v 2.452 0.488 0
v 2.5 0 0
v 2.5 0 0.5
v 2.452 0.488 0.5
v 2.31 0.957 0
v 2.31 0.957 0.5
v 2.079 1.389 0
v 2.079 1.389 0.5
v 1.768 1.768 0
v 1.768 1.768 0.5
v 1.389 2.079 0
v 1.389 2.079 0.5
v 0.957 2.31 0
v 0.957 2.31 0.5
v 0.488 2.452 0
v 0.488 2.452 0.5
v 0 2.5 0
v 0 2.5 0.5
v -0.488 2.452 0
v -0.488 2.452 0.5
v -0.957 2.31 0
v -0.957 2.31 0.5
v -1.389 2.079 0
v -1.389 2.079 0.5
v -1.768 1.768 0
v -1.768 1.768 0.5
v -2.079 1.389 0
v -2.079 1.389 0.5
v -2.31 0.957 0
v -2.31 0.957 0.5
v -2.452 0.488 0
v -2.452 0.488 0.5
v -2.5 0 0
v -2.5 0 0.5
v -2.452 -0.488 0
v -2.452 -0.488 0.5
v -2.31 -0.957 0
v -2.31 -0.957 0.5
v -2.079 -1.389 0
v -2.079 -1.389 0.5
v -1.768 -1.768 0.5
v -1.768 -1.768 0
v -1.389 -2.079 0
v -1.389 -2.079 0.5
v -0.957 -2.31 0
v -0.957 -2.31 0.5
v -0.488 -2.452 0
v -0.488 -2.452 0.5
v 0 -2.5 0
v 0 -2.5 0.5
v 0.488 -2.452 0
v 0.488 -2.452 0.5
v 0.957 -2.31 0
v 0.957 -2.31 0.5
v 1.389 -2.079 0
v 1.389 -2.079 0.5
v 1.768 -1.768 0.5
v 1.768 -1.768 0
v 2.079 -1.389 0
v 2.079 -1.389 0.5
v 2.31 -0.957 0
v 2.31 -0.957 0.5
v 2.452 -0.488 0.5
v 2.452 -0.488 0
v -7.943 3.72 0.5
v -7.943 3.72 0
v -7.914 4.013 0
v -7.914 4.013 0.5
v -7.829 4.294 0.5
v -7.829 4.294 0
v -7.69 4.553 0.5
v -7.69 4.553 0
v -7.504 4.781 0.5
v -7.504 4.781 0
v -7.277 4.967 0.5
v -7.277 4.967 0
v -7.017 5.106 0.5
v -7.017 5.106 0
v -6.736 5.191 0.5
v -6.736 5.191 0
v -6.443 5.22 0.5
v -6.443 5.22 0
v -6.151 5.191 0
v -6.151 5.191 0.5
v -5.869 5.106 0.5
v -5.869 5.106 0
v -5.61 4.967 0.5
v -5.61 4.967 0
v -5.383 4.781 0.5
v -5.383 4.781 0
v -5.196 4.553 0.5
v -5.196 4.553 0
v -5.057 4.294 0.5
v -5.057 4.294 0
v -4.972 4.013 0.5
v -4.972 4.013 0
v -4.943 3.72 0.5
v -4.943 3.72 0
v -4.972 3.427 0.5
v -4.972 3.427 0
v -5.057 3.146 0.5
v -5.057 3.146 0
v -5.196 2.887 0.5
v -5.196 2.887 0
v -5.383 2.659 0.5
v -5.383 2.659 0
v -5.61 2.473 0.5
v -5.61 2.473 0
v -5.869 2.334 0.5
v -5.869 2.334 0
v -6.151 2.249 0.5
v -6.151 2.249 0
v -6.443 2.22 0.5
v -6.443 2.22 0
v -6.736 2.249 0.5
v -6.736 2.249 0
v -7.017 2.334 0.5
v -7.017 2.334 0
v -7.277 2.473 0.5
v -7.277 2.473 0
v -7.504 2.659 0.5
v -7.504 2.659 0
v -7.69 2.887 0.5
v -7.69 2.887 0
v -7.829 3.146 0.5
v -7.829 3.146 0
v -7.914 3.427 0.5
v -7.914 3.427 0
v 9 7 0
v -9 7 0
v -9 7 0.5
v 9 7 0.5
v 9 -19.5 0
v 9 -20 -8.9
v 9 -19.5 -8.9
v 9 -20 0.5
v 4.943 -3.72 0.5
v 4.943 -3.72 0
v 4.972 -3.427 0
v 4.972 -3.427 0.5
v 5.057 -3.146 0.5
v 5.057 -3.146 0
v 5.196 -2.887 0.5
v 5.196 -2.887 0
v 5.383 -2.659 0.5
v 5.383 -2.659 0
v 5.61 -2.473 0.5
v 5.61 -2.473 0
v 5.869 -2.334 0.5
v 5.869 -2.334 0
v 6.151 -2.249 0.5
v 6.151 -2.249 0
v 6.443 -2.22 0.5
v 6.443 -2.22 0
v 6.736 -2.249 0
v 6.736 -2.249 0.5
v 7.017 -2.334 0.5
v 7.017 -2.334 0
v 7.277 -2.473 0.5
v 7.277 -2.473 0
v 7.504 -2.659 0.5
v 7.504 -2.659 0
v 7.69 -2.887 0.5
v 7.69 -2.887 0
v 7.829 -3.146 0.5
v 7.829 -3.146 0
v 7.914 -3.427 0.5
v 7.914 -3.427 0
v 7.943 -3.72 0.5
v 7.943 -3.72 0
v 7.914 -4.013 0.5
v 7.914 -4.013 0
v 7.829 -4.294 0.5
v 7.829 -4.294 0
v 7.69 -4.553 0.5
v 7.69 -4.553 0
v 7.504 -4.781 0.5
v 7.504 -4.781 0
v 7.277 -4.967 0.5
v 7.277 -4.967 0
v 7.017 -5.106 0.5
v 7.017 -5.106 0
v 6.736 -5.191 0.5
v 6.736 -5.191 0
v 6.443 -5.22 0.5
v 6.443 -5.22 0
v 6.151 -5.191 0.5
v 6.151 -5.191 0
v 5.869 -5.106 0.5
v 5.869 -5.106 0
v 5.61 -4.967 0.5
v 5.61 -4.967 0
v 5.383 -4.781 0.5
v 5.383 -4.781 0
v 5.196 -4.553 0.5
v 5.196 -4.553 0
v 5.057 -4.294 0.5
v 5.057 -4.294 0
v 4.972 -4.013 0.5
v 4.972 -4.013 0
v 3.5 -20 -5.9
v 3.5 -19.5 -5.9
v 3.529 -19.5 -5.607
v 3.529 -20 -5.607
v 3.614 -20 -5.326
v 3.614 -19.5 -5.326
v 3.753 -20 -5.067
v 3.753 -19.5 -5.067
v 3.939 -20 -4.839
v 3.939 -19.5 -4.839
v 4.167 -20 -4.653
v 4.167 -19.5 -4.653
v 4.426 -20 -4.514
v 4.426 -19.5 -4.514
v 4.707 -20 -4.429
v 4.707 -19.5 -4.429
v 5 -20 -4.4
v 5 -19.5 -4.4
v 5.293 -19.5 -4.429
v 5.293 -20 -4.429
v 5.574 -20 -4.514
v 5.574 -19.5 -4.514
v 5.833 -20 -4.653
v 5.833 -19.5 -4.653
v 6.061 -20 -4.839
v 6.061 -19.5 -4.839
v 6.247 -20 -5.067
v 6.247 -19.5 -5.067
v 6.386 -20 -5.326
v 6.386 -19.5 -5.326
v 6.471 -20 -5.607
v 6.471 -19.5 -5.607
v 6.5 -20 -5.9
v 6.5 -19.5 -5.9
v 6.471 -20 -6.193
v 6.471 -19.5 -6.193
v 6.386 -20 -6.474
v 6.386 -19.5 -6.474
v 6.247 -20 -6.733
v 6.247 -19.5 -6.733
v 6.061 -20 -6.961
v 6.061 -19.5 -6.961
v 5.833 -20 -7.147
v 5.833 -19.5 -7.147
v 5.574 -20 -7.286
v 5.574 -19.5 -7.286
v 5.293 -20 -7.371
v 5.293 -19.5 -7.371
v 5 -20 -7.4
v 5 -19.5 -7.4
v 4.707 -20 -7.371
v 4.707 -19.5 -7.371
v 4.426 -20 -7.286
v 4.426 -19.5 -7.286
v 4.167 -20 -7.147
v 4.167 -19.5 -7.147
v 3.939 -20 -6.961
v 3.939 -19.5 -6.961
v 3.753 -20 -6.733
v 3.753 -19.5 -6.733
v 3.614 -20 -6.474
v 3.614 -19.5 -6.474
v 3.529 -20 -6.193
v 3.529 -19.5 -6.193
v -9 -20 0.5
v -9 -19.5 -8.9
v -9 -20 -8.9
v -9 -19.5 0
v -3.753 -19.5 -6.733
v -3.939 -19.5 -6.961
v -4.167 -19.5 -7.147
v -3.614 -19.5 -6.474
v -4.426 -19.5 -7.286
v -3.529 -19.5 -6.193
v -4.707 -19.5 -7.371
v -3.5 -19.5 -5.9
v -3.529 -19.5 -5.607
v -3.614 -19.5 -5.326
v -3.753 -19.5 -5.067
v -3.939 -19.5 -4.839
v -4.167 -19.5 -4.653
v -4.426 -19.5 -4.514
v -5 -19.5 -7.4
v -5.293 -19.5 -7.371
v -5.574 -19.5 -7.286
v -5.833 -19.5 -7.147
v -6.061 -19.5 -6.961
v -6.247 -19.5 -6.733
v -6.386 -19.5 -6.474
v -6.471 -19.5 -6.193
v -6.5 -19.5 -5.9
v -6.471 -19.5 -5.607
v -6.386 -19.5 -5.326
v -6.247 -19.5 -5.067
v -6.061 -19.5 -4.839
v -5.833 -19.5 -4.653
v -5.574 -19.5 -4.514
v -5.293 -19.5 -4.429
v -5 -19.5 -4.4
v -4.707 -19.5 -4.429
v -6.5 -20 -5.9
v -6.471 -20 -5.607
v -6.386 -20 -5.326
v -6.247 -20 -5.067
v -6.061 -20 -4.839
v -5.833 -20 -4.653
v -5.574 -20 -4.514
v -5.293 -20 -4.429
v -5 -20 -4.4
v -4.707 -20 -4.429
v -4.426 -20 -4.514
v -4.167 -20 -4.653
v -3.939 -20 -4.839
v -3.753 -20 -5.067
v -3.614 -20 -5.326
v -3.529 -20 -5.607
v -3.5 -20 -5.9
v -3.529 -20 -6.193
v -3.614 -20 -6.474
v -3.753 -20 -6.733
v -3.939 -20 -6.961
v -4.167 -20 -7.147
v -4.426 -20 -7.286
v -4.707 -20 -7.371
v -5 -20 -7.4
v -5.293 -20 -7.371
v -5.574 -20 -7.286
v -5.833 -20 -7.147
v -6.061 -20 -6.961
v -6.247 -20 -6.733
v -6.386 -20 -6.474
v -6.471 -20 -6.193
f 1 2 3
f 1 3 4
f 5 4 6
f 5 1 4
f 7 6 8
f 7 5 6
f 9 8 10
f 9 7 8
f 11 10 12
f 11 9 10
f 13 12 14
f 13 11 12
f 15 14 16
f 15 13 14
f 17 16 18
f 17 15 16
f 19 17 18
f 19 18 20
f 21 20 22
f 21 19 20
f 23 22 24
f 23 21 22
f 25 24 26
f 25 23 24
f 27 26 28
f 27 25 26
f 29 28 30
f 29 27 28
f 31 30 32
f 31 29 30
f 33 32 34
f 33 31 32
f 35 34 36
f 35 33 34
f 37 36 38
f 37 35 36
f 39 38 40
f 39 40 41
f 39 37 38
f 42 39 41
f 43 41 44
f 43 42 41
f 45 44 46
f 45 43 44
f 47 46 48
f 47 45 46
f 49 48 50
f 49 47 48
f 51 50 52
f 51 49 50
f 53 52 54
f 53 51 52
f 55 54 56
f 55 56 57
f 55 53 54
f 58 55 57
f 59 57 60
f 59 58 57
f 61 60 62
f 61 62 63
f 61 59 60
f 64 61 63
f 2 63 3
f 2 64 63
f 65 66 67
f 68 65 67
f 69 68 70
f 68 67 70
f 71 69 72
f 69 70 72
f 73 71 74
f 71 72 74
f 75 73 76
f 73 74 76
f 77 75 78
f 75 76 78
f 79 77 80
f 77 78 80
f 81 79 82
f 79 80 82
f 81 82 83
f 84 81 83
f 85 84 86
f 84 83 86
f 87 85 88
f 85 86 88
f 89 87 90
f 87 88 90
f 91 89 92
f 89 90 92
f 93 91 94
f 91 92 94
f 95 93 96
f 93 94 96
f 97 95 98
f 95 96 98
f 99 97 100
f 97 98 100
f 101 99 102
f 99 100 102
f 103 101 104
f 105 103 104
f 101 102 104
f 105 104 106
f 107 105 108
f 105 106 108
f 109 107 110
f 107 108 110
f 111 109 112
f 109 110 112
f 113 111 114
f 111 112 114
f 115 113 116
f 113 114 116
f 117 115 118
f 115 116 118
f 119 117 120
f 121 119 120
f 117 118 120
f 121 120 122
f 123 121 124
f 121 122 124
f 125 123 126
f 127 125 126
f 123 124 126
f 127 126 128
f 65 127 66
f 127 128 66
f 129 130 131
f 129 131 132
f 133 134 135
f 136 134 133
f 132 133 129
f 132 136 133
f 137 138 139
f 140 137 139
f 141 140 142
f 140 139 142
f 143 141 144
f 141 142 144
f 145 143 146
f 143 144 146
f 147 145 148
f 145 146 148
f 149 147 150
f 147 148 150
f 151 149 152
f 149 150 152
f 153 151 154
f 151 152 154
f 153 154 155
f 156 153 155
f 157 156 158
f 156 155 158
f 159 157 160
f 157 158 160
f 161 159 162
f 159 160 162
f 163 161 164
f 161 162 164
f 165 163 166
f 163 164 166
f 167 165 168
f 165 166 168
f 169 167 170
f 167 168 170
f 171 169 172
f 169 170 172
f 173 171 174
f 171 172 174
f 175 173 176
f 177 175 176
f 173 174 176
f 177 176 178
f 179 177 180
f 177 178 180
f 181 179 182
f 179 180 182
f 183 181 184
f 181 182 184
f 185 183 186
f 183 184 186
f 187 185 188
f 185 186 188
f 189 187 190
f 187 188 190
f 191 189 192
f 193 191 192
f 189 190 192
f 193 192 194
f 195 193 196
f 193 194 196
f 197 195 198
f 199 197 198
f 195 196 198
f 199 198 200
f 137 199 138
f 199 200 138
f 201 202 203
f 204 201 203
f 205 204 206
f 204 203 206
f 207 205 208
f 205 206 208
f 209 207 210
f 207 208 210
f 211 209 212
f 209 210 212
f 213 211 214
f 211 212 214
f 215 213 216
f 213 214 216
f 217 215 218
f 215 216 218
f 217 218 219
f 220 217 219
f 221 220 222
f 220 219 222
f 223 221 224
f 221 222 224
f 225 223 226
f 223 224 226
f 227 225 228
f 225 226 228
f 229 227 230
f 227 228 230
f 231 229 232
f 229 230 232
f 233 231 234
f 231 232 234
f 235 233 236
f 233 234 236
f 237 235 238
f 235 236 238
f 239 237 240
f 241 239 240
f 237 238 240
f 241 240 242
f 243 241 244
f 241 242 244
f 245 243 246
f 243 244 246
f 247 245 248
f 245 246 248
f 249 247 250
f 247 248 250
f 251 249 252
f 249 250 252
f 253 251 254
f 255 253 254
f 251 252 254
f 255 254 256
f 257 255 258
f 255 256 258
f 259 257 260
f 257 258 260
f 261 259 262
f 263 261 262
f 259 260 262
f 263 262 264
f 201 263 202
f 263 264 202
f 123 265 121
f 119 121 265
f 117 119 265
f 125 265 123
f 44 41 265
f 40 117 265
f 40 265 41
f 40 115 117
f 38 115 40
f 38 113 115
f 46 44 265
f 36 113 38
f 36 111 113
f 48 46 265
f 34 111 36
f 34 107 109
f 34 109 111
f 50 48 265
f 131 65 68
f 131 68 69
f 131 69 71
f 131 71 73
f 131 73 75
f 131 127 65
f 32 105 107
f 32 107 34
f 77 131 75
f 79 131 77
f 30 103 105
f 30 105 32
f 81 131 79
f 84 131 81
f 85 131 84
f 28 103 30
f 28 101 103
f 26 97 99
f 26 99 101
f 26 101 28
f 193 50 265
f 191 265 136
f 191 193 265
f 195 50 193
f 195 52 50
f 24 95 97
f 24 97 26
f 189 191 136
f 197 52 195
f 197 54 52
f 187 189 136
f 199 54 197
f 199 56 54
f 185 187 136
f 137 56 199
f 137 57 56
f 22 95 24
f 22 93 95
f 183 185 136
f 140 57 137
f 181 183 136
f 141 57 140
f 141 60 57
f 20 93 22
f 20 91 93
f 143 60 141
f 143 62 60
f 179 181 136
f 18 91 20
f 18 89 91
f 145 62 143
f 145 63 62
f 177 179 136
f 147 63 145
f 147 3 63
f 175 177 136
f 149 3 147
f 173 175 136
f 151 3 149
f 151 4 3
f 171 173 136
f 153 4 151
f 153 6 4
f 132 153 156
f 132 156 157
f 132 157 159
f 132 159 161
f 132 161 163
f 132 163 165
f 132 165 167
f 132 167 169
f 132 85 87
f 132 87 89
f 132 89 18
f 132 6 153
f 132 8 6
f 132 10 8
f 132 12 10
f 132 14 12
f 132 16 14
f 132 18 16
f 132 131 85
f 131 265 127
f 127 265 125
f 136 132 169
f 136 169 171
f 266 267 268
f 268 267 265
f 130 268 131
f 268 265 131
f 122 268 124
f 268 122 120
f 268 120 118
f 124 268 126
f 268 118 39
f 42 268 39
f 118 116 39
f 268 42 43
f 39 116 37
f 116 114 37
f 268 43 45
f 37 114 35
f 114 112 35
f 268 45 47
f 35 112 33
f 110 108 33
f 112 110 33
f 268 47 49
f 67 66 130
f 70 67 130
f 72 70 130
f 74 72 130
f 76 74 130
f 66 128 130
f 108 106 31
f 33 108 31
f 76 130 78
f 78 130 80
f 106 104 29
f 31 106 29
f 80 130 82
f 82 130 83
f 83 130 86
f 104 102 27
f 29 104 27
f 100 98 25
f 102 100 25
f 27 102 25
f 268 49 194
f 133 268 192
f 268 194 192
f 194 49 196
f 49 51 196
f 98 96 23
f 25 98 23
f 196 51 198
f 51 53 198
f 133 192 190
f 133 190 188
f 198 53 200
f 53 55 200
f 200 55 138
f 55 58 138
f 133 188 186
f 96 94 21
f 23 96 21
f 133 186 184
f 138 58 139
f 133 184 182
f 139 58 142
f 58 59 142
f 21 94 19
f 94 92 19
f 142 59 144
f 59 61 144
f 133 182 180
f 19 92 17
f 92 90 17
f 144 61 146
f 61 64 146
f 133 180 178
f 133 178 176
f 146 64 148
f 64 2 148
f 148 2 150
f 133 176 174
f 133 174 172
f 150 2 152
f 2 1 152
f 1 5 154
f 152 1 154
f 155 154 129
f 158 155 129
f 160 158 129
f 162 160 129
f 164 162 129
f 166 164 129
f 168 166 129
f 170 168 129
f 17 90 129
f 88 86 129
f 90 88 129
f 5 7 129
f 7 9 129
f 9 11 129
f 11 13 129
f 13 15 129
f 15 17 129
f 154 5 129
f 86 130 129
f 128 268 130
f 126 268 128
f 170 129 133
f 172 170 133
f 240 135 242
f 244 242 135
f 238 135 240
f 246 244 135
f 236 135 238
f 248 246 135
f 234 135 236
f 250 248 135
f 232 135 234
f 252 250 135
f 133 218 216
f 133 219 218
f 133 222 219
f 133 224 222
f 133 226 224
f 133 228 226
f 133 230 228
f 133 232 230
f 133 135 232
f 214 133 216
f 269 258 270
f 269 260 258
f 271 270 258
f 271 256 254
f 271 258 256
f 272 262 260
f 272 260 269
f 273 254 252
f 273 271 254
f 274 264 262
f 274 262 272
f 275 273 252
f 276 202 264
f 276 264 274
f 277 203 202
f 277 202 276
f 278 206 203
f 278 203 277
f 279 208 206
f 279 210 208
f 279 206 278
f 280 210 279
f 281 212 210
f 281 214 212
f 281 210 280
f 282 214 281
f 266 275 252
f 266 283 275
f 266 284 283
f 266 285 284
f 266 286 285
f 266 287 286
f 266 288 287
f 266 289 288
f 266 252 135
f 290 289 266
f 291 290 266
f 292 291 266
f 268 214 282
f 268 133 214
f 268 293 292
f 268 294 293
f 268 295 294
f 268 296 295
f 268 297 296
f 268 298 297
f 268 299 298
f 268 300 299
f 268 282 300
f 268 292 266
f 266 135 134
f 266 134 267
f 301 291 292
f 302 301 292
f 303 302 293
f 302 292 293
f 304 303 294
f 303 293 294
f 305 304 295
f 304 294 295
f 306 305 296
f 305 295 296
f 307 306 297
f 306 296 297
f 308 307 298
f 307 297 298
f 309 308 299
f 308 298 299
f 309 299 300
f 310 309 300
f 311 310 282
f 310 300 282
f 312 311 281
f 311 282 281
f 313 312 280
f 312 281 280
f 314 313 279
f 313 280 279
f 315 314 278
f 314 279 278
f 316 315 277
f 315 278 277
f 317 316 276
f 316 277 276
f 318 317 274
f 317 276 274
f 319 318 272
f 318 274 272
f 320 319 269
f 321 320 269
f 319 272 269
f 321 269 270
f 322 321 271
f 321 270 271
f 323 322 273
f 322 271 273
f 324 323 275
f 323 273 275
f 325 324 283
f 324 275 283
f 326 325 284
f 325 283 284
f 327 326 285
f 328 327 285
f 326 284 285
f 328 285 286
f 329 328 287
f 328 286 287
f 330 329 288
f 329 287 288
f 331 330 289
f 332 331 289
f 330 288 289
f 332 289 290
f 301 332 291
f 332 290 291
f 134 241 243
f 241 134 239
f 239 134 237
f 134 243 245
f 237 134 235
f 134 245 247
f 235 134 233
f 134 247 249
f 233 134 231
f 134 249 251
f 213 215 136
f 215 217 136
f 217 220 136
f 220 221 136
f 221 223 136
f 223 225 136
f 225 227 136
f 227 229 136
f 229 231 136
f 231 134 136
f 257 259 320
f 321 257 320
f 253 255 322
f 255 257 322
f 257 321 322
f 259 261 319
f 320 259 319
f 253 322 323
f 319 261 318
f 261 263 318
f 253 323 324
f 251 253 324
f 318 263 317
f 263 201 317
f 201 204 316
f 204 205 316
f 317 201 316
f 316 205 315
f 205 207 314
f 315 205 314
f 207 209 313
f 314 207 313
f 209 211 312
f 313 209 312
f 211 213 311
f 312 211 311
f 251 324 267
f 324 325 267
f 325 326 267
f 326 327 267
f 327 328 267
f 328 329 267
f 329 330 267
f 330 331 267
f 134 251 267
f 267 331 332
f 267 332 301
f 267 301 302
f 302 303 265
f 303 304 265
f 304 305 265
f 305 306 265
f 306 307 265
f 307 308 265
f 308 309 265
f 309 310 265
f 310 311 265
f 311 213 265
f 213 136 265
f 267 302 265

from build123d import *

# Parameters (mm, degrees)
SKETCH1_W      = 18
SKETCH1_H      = 27
SKETCH1_R      = 2.5
EXTRUDE1_DEPTH = 0.5
SKETCH2_W      = 18
SKETCH2_H      = 0.5
EXTRUDE2_DEPTH = 8.9
SKETCH3_R      = 1.5
EXTRUDE3_DEPTH = 0.5
SKETCH4_R      = 1.5
EXTRUDE4_DEPTH = 0.5


with BuildPart() as part:
    # Sketch1 → Extrude1 (new body)
    with BuildSketch(Plane.XY):
        with Locations((0, -6.5)):
            Rectangle(SKETCH1_W, SKETCH1_H)
        Circle(SKETCH1_R, mode=Mode.SUBTRACT)
    extrude(amount=EXTRUDE1_DEPTH)

    # Sketch2 → Extrude2 (add)
    with BuildSketch(Plane(origin=(0, 0, 0), x_dir=(-1, 0, 0), z_dir=(0, 0, -1))):
        with Locations((0, -19.75)):
            Rectangle(SKETCH2_W, SKETCH2_H)
    extrude(amount=EXTRUDE2_DEPTH)

    # Sketch3 → Extrude3 (cut)
    with BuildSketch(Plane(origin=(0, -19.5, 0), x_dir=(1, 0, 0), z_dir=(0, 1, 0))):
        with Locations(Location((-5, 5.9, 0), (0, 0, 180))):
            Circle(SKETCH3_R)
        with Locations(Location((5, 5.9, 0), (0, 0, 180))):
            Circle(SKETCH3_R)
    extrude(amount=-EXTRUDE3_DEPTH, mode=Mode.SUBTRACT)

    # Sketch4 → Extrude4 (cut)
    with BuildSketch(Plane(origin=(0, 0, 0), x_dir=(-1, 0, 0), z_dir=(0, 0, -1))):
        with Locations((-6.443229004, -3.72)):
            Circle(SKETCH4_R)
        with Locations((6.443229004, 3.72)):
            Circle(SKETCH4_R)
    extrude(amount=-EXTRUDE4_DEPTH, mode=Mode.SUBTRACT)


solid = part.part
